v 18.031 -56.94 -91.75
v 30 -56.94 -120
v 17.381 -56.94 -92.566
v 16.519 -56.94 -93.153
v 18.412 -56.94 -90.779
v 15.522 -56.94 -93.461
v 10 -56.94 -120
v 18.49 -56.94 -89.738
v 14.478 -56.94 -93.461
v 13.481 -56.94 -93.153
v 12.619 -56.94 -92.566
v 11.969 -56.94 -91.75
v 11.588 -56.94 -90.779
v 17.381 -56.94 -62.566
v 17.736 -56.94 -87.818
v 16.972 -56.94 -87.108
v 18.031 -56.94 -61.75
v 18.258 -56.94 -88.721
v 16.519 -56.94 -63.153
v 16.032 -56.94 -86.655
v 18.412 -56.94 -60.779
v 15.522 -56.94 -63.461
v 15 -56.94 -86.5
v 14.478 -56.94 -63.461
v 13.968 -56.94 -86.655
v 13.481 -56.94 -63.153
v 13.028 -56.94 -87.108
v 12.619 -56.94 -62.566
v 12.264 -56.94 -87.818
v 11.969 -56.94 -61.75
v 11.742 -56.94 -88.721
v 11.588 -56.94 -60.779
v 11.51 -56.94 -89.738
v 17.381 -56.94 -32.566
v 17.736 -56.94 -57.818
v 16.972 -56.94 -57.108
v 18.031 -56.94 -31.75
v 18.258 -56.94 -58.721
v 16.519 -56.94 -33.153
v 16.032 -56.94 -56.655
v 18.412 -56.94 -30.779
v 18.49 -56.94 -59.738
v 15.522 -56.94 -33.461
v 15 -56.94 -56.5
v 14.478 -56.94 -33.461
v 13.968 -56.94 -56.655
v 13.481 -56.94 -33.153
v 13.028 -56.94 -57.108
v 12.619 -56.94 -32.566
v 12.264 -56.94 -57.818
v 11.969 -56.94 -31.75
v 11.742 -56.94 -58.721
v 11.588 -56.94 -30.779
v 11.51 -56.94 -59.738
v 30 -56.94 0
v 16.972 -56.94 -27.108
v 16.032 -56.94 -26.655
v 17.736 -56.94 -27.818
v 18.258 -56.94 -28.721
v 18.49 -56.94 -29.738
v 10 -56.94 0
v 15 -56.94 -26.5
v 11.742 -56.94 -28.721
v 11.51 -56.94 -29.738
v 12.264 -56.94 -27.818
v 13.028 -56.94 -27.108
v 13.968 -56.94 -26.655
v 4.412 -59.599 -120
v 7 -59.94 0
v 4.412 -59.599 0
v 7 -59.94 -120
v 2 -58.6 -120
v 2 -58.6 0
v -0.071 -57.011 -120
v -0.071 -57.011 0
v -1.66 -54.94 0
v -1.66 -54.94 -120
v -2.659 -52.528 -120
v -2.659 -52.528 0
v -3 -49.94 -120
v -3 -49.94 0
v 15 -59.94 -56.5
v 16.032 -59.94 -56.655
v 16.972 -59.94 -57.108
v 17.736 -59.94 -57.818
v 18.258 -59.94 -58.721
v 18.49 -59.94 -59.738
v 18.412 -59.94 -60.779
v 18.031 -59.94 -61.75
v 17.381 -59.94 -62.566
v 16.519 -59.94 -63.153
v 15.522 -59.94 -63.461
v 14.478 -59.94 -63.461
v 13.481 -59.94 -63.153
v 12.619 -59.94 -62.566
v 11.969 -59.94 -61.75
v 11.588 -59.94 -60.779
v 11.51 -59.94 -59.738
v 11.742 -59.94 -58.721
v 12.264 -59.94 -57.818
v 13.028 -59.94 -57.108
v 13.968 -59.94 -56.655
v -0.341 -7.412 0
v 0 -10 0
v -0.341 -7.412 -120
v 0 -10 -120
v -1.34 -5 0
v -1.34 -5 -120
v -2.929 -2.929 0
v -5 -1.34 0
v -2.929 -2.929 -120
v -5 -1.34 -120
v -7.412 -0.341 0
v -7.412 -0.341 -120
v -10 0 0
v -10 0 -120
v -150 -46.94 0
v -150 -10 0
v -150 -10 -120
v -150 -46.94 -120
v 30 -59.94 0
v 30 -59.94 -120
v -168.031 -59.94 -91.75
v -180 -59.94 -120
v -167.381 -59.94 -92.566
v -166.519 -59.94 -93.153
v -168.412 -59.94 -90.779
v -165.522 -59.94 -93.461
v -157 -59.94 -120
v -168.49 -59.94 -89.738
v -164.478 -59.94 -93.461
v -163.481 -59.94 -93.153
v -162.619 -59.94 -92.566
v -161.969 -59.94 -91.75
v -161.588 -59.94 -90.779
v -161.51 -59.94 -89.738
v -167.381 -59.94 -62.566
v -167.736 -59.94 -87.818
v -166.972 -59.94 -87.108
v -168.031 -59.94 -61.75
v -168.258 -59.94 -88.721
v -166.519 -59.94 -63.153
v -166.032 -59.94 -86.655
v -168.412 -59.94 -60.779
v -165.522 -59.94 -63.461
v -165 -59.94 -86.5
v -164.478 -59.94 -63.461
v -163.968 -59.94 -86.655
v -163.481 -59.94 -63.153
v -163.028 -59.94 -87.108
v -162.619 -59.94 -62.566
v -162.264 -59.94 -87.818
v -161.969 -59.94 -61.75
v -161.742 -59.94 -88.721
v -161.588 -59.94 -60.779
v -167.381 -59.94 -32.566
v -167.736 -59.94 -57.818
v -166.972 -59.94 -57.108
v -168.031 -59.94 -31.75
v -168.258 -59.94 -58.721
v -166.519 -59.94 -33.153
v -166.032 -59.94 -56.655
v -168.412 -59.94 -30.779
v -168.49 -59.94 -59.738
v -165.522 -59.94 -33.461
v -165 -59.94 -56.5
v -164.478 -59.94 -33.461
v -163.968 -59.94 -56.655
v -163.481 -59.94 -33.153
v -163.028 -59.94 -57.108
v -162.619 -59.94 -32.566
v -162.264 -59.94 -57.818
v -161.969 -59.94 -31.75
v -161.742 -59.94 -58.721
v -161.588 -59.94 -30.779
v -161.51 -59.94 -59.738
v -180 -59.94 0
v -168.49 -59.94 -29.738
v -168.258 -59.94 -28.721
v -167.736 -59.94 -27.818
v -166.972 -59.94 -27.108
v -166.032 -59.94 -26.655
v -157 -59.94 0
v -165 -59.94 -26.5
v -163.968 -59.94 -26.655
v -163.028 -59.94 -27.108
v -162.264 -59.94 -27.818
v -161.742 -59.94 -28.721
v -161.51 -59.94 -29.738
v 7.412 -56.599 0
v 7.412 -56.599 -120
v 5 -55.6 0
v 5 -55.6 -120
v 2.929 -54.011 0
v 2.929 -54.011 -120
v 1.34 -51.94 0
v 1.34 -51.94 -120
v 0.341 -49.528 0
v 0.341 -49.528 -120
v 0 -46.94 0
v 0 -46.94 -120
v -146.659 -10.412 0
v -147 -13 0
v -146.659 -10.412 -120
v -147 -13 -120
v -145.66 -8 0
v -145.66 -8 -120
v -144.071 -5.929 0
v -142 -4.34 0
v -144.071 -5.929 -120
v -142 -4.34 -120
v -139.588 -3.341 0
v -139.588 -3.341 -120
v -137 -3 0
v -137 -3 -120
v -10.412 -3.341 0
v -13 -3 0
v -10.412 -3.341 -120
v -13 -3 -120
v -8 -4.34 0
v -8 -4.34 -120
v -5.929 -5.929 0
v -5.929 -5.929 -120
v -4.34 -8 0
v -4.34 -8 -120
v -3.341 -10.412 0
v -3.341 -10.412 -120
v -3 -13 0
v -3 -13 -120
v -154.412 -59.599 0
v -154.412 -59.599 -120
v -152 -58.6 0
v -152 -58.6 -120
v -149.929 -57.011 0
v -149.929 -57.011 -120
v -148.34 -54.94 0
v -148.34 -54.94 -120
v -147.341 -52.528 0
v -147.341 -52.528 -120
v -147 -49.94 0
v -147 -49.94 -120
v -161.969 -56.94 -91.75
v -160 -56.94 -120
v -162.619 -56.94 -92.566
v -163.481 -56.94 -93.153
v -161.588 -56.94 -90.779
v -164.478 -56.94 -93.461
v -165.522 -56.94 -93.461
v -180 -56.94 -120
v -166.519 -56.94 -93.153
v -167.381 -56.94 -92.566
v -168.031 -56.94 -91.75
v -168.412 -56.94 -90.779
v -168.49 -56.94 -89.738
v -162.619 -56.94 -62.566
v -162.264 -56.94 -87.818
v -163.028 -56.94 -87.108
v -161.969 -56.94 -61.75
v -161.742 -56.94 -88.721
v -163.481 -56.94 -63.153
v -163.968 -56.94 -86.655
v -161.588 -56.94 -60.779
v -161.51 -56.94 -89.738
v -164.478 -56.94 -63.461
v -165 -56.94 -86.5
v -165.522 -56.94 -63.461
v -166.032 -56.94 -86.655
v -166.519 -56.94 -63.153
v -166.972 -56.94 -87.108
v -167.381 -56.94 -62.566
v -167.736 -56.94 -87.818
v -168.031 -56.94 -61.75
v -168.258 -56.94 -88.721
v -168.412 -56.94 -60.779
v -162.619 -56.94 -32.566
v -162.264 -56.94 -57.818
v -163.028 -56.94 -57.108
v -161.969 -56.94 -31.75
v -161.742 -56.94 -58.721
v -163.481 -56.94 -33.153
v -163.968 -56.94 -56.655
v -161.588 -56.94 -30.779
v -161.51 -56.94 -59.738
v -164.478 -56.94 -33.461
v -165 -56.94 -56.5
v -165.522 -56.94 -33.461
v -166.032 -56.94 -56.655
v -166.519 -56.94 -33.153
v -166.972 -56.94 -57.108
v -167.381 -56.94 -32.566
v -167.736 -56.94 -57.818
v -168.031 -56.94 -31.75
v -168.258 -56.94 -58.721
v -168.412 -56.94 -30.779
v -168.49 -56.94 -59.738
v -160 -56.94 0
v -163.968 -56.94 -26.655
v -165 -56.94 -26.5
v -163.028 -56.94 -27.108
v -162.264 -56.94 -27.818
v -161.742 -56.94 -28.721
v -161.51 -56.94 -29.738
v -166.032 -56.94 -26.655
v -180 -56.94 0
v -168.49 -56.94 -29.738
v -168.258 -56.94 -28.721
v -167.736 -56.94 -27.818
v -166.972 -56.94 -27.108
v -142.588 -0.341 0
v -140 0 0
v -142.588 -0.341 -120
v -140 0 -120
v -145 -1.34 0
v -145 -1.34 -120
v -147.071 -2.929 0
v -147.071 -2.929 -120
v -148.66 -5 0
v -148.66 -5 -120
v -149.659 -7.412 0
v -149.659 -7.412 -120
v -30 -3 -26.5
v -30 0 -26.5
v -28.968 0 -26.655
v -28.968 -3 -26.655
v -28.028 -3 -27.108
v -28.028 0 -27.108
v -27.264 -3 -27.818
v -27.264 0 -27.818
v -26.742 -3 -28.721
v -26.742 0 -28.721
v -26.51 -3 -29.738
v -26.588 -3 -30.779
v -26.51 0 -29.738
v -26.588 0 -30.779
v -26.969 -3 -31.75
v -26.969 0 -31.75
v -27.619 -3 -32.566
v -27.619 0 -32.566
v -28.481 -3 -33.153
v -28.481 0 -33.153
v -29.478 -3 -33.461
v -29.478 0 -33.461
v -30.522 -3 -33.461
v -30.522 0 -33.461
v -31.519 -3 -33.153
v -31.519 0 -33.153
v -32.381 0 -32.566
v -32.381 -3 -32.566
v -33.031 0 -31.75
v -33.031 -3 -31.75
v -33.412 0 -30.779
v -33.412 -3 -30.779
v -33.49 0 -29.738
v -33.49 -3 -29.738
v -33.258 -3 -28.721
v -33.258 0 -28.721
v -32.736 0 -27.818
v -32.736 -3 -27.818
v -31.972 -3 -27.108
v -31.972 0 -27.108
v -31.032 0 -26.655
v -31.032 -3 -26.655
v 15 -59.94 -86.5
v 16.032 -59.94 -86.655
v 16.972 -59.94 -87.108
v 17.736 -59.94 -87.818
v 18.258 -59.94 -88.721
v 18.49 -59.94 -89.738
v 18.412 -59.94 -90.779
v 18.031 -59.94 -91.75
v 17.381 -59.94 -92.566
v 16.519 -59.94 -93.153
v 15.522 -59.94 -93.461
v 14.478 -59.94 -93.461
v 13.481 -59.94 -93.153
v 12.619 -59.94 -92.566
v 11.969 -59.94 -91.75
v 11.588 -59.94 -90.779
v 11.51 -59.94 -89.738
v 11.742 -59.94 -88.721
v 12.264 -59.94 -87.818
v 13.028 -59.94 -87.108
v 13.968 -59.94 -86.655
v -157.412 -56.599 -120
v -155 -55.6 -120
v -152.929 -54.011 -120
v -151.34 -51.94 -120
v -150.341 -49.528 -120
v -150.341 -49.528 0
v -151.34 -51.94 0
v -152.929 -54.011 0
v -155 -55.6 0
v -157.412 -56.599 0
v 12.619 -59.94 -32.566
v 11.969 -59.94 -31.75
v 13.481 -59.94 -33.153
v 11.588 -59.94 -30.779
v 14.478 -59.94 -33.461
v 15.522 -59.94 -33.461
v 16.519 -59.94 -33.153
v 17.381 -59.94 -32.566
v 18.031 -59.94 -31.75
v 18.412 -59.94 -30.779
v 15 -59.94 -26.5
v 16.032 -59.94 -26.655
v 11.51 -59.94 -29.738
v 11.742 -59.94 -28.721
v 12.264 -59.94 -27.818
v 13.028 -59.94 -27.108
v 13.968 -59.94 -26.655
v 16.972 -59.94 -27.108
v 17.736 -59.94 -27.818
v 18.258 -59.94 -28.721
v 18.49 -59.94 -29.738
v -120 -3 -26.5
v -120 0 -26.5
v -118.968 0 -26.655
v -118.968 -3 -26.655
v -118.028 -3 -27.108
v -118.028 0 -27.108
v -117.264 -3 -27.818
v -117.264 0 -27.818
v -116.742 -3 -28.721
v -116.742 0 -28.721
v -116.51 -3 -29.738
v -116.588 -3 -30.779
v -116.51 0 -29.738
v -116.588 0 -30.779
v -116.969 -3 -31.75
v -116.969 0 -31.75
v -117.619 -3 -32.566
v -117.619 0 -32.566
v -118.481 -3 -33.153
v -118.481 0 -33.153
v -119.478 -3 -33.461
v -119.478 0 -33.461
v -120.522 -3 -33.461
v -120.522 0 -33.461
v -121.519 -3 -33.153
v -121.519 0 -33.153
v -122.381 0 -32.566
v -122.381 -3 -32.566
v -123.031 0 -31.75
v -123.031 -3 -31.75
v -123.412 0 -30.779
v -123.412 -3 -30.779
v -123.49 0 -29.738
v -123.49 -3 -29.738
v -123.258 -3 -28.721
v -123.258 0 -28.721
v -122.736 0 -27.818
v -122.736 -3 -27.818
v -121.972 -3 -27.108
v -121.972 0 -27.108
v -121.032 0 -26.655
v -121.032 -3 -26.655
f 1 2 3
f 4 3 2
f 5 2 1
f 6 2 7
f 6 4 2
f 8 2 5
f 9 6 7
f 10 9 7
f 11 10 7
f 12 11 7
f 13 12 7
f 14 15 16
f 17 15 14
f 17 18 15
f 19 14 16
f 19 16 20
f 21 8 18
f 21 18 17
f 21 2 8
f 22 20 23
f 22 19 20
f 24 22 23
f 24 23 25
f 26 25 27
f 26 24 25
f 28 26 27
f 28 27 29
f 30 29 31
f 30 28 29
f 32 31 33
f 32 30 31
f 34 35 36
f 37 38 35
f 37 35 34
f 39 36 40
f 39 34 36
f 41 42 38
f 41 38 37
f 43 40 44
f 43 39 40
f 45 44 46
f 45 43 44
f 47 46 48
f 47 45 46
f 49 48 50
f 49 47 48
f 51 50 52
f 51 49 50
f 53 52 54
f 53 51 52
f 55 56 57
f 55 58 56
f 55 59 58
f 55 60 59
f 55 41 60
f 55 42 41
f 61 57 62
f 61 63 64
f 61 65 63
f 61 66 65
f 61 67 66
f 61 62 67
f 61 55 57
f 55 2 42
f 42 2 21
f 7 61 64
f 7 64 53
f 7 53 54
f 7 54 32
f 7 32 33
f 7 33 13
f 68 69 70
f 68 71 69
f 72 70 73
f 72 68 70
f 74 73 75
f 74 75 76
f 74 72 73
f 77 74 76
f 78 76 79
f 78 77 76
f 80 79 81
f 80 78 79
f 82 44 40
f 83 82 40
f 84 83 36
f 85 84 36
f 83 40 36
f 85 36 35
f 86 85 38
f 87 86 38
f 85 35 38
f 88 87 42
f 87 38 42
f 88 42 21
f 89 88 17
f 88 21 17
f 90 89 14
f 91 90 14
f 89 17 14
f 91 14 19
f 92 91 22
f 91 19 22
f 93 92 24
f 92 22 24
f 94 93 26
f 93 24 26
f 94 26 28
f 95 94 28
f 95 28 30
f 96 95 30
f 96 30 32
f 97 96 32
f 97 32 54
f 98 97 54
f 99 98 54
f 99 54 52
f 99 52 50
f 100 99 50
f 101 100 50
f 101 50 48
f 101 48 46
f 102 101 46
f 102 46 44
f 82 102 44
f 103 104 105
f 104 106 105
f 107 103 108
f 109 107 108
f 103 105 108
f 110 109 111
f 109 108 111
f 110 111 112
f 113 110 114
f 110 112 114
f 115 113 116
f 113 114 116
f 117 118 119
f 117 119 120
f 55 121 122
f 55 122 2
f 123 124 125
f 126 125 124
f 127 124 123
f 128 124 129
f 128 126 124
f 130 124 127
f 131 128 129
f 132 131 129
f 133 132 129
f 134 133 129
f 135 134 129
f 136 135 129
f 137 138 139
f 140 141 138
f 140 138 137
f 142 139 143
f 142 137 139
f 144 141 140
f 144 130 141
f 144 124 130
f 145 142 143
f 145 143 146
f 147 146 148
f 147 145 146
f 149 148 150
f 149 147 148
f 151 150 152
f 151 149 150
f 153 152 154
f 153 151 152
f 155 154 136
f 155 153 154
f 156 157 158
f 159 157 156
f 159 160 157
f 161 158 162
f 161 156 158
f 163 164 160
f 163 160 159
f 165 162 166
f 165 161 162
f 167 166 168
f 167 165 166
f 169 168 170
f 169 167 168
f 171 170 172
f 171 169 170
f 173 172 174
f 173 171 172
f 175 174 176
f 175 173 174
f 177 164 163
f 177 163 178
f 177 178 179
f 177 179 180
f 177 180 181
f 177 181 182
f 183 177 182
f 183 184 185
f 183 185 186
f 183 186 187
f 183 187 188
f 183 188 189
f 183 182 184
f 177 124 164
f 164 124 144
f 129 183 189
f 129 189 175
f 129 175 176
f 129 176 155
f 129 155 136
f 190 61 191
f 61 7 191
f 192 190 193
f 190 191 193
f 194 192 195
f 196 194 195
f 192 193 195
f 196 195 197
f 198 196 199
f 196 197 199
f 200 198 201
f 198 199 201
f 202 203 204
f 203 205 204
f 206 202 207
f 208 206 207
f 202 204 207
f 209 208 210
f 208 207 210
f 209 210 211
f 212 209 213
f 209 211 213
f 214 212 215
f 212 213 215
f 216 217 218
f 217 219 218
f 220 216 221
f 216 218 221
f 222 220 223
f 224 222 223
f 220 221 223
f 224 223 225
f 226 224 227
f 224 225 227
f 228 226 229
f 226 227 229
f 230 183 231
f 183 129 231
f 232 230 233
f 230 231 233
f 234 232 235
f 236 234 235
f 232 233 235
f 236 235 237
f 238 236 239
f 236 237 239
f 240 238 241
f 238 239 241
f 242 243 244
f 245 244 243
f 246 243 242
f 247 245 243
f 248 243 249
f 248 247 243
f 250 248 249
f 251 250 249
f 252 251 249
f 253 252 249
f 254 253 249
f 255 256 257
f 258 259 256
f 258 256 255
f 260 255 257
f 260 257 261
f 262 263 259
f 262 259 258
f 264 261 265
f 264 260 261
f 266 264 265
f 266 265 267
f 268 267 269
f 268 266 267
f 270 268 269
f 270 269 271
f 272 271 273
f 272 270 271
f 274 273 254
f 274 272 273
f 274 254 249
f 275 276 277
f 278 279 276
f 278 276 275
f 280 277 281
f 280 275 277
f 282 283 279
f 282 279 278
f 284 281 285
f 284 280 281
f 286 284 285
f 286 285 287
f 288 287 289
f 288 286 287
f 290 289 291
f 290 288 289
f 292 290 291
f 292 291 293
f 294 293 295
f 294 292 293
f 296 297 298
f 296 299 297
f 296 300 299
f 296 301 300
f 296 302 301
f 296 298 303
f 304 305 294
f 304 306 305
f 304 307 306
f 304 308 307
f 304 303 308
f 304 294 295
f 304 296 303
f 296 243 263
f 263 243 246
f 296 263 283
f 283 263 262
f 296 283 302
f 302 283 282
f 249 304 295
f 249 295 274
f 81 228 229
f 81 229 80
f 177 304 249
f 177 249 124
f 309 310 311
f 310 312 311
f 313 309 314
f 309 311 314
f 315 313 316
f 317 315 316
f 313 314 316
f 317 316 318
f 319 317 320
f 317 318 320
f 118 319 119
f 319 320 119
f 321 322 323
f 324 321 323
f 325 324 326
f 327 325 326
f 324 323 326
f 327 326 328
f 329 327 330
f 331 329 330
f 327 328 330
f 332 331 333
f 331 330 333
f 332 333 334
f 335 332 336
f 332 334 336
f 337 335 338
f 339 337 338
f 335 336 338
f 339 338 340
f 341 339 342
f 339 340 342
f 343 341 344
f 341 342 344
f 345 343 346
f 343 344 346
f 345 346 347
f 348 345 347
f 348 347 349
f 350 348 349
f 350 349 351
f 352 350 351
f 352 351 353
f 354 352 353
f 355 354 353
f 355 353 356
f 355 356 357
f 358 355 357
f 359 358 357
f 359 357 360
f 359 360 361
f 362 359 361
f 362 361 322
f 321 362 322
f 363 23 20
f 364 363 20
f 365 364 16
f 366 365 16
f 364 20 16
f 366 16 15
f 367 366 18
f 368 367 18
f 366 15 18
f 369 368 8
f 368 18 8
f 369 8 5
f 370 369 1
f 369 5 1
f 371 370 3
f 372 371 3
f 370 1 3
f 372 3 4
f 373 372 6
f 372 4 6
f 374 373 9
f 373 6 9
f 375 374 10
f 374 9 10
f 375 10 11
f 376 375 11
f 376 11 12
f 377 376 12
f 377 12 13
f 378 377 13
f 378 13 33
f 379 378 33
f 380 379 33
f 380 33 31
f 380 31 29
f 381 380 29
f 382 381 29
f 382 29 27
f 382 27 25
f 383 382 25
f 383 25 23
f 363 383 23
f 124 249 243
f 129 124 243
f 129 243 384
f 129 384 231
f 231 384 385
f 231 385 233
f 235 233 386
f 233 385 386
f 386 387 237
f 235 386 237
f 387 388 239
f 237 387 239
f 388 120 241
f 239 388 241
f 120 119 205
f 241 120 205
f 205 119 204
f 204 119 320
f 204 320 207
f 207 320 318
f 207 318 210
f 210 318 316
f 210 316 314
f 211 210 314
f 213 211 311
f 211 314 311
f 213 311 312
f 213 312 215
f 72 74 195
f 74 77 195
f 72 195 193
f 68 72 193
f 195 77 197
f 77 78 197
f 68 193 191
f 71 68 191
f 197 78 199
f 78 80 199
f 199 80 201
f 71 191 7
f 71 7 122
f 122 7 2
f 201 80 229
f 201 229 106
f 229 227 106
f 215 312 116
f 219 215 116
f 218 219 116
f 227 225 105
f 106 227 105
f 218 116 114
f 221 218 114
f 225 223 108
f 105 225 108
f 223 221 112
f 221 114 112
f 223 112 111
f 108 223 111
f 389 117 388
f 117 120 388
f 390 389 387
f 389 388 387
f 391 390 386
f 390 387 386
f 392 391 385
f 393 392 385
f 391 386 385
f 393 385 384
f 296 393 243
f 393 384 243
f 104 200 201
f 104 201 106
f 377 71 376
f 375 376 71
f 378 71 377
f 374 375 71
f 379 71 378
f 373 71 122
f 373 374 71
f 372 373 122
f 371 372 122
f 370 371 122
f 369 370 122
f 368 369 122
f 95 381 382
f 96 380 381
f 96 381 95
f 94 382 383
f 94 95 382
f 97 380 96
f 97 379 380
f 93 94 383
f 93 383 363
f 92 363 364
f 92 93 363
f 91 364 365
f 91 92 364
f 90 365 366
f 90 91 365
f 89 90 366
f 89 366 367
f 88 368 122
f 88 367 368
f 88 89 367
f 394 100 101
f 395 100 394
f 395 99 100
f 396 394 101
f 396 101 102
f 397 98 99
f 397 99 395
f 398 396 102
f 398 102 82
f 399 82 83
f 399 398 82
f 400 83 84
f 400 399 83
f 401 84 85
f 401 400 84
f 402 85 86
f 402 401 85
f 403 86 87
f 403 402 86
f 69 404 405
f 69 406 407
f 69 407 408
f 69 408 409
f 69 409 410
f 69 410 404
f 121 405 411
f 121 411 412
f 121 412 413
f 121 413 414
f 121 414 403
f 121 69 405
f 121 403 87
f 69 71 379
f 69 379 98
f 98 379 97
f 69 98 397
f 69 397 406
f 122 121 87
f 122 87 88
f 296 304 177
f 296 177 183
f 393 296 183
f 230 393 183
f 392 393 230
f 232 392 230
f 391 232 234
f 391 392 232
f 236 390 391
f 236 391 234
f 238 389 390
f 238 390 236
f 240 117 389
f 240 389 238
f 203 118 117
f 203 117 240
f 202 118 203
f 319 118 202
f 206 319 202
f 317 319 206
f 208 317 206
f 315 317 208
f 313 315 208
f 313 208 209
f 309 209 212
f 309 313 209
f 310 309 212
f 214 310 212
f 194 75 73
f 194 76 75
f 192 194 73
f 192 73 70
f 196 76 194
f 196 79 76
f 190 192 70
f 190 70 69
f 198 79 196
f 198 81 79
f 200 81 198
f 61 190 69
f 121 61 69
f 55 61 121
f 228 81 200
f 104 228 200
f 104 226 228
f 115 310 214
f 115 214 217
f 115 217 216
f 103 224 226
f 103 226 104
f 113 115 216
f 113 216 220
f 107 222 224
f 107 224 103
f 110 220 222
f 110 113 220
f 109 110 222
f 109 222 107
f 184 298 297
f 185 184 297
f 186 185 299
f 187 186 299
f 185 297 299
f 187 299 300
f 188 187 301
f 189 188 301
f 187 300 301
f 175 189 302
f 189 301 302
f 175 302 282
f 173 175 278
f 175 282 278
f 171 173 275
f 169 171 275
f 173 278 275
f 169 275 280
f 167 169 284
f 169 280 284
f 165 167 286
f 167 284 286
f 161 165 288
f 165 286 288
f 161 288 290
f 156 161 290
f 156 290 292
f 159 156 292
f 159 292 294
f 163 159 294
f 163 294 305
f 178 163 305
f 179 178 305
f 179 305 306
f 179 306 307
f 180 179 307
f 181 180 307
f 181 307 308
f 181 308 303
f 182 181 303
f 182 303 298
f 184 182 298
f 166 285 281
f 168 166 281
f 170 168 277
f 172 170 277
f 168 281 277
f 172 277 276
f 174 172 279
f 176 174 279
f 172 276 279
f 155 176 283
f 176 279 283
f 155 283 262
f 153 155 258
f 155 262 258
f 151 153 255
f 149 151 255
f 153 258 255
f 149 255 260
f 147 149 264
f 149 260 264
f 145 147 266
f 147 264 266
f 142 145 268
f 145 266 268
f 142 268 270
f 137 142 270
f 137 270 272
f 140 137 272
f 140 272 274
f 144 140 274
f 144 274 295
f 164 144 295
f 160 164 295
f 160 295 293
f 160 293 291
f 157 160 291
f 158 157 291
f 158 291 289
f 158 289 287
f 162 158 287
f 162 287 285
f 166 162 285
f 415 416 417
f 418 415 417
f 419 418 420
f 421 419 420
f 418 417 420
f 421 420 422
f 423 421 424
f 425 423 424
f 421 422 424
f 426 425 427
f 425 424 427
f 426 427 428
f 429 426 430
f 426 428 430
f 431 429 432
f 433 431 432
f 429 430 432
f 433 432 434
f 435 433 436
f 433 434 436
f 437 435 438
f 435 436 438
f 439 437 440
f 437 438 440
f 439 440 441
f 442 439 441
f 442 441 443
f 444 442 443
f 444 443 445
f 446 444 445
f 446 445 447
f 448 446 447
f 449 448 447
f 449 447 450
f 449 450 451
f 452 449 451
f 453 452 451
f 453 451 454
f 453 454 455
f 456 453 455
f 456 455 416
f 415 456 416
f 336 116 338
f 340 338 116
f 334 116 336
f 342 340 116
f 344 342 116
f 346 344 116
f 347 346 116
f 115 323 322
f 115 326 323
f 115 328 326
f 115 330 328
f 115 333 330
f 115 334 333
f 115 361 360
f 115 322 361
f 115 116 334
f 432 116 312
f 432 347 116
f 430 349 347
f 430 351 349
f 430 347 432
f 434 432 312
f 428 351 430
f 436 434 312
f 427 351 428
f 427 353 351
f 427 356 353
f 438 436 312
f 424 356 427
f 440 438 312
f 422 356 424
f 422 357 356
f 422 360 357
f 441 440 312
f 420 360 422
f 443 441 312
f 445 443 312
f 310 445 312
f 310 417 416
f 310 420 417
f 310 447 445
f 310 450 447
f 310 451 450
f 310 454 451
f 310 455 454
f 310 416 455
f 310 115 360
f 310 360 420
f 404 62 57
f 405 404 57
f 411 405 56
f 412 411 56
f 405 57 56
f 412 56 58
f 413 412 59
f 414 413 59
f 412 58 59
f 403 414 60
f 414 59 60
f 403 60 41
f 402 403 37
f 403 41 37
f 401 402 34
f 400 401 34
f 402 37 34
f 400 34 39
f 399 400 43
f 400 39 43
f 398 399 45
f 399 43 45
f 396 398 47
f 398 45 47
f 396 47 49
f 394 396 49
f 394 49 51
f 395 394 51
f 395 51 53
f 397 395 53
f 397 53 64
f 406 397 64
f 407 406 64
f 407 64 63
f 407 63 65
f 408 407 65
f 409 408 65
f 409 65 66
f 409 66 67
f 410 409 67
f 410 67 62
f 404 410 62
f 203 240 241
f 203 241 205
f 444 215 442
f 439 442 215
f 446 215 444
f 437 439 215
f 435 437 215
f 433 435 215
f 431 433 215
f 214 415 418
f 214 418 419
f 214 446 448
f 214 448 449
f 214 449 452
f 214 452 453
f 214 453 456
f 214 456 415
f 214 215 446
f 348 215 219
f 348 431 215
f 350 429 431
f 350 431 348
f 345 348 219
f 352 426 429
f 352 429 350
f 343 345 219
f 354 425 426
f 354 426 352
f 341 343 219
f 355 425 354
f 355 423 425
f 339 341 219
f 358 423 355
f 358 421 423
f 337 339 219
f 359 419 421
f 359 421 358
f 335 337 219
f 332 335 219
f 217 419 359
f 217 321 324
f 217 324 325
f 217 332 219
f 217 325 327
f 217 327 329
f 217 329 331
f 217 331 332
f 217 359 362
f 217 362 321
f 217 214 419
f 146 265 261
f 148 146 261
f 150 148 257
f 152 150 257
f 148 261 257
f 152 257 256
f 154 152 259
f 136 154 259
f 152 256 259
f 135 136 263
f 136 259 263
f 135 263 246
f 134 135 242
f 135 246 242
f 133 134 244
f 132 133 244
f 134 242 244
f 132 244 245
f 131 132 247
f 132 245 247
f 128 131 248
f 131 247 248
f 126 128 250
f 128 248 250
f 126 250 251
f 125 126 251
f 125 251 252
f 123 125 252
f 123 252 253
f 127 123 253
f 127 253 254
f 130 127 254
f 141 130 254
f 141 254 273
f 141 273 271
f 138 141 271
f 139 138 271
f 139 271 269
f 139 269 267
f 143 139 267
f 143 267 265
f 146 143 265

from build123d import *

# Parameters (mm, degrees)
EXTRUDE_THIN1_DEPTH = 120
SKETCH2_R           = 3.5
CUT_EXTRUDE1_DEPTH  = 10
LPATTERN1_COUNT     = 2
LPATTERN1_PITCH     = 180
SKETCH3_R           = 3.5
CUT_EXTRUDE2_DEPTH  = 10
FILLET1_R           = 10


with BuildPart() as part:
    # Sketch1 → Extrude-Thin1 (new body)
    with BuildSketch(Plane.XY):
        Polygon((30, -56.94), (0, -56.94), (0, 0), (-150, 0), (-150, -56.94), (-180, -56.94), (-180, -59.94), (-147, -59.94), (-147, -3), (-3, -3), (-3, -59.94), (30, -59.94), align=None)
    extrude(amount=-EXTRUDE_THIN1_DEPTH)

    # Sketch2 → Cut-Extrude1 (cut)
    with BuildSketch(Plane(origin=(0, -56.94, 0), x_dir=(1, 0, 0), z_dir=(0, 1, 0))):
        with Locations(Location((15, 30, 0), (0, 0, 270))):
            Circle(SKETCH2_R)
        with Locations(Location((15, 60, 0), (0, 0, 270))):
            Circle(SKETCH2_R)
        with Locations(Location((15, 90, 0), (0, 0, 270))):
            Circle(SKETCH2_R)
    cut_extrude1 = extrude(amount=-CUT_EXTRUDE1_DEPTH, mode=Mode.SUBTRACT)

    # LPattern1: Cut-Extrude1 ×2
    with Locations(*[(-i * LPATTERN1_PITCH, 0, 0) for i in range(1, LPATTERN1_COUNT)]):
        add(cut_extrude1, mode=Mode.SUBTRACT)

    # Sketch3 → Cut-Extrude2 (cut)
    with BuildSketch(Plane(origin=(0, 0, 0), x_dir=(1, 0, 0), z_dir=(0, 1, 0))):
        with Locations(Location((-30, 30, 0), (0, 0, 270))):
            Circle(SKETCH3_R)
        with Locations(Location((-120, 30, 0), (0, 0, 270))):
            Circle(SKETCH3_R)
    extrude(amount=-CUT_EXTRUDE2_DEPTH, mode=Mode.SUBTRACT)

    # Fillet1
    fillet1_edges = [part.edges().sort_by_distance(p)[0] for p in [
        (-150, -56.94, -60),
        (-150, 0, -60),
        (0, 0, -60),
        (0, -56.94, -60),
        (-3, -59.94, -60),
        (-3, -3, -60),
        (-147, -3, -60),
        (-147, -59.94, -60),
    ]]
    fillet(fillet1_edges, radius=FILLET1_R)


solid = part.part
